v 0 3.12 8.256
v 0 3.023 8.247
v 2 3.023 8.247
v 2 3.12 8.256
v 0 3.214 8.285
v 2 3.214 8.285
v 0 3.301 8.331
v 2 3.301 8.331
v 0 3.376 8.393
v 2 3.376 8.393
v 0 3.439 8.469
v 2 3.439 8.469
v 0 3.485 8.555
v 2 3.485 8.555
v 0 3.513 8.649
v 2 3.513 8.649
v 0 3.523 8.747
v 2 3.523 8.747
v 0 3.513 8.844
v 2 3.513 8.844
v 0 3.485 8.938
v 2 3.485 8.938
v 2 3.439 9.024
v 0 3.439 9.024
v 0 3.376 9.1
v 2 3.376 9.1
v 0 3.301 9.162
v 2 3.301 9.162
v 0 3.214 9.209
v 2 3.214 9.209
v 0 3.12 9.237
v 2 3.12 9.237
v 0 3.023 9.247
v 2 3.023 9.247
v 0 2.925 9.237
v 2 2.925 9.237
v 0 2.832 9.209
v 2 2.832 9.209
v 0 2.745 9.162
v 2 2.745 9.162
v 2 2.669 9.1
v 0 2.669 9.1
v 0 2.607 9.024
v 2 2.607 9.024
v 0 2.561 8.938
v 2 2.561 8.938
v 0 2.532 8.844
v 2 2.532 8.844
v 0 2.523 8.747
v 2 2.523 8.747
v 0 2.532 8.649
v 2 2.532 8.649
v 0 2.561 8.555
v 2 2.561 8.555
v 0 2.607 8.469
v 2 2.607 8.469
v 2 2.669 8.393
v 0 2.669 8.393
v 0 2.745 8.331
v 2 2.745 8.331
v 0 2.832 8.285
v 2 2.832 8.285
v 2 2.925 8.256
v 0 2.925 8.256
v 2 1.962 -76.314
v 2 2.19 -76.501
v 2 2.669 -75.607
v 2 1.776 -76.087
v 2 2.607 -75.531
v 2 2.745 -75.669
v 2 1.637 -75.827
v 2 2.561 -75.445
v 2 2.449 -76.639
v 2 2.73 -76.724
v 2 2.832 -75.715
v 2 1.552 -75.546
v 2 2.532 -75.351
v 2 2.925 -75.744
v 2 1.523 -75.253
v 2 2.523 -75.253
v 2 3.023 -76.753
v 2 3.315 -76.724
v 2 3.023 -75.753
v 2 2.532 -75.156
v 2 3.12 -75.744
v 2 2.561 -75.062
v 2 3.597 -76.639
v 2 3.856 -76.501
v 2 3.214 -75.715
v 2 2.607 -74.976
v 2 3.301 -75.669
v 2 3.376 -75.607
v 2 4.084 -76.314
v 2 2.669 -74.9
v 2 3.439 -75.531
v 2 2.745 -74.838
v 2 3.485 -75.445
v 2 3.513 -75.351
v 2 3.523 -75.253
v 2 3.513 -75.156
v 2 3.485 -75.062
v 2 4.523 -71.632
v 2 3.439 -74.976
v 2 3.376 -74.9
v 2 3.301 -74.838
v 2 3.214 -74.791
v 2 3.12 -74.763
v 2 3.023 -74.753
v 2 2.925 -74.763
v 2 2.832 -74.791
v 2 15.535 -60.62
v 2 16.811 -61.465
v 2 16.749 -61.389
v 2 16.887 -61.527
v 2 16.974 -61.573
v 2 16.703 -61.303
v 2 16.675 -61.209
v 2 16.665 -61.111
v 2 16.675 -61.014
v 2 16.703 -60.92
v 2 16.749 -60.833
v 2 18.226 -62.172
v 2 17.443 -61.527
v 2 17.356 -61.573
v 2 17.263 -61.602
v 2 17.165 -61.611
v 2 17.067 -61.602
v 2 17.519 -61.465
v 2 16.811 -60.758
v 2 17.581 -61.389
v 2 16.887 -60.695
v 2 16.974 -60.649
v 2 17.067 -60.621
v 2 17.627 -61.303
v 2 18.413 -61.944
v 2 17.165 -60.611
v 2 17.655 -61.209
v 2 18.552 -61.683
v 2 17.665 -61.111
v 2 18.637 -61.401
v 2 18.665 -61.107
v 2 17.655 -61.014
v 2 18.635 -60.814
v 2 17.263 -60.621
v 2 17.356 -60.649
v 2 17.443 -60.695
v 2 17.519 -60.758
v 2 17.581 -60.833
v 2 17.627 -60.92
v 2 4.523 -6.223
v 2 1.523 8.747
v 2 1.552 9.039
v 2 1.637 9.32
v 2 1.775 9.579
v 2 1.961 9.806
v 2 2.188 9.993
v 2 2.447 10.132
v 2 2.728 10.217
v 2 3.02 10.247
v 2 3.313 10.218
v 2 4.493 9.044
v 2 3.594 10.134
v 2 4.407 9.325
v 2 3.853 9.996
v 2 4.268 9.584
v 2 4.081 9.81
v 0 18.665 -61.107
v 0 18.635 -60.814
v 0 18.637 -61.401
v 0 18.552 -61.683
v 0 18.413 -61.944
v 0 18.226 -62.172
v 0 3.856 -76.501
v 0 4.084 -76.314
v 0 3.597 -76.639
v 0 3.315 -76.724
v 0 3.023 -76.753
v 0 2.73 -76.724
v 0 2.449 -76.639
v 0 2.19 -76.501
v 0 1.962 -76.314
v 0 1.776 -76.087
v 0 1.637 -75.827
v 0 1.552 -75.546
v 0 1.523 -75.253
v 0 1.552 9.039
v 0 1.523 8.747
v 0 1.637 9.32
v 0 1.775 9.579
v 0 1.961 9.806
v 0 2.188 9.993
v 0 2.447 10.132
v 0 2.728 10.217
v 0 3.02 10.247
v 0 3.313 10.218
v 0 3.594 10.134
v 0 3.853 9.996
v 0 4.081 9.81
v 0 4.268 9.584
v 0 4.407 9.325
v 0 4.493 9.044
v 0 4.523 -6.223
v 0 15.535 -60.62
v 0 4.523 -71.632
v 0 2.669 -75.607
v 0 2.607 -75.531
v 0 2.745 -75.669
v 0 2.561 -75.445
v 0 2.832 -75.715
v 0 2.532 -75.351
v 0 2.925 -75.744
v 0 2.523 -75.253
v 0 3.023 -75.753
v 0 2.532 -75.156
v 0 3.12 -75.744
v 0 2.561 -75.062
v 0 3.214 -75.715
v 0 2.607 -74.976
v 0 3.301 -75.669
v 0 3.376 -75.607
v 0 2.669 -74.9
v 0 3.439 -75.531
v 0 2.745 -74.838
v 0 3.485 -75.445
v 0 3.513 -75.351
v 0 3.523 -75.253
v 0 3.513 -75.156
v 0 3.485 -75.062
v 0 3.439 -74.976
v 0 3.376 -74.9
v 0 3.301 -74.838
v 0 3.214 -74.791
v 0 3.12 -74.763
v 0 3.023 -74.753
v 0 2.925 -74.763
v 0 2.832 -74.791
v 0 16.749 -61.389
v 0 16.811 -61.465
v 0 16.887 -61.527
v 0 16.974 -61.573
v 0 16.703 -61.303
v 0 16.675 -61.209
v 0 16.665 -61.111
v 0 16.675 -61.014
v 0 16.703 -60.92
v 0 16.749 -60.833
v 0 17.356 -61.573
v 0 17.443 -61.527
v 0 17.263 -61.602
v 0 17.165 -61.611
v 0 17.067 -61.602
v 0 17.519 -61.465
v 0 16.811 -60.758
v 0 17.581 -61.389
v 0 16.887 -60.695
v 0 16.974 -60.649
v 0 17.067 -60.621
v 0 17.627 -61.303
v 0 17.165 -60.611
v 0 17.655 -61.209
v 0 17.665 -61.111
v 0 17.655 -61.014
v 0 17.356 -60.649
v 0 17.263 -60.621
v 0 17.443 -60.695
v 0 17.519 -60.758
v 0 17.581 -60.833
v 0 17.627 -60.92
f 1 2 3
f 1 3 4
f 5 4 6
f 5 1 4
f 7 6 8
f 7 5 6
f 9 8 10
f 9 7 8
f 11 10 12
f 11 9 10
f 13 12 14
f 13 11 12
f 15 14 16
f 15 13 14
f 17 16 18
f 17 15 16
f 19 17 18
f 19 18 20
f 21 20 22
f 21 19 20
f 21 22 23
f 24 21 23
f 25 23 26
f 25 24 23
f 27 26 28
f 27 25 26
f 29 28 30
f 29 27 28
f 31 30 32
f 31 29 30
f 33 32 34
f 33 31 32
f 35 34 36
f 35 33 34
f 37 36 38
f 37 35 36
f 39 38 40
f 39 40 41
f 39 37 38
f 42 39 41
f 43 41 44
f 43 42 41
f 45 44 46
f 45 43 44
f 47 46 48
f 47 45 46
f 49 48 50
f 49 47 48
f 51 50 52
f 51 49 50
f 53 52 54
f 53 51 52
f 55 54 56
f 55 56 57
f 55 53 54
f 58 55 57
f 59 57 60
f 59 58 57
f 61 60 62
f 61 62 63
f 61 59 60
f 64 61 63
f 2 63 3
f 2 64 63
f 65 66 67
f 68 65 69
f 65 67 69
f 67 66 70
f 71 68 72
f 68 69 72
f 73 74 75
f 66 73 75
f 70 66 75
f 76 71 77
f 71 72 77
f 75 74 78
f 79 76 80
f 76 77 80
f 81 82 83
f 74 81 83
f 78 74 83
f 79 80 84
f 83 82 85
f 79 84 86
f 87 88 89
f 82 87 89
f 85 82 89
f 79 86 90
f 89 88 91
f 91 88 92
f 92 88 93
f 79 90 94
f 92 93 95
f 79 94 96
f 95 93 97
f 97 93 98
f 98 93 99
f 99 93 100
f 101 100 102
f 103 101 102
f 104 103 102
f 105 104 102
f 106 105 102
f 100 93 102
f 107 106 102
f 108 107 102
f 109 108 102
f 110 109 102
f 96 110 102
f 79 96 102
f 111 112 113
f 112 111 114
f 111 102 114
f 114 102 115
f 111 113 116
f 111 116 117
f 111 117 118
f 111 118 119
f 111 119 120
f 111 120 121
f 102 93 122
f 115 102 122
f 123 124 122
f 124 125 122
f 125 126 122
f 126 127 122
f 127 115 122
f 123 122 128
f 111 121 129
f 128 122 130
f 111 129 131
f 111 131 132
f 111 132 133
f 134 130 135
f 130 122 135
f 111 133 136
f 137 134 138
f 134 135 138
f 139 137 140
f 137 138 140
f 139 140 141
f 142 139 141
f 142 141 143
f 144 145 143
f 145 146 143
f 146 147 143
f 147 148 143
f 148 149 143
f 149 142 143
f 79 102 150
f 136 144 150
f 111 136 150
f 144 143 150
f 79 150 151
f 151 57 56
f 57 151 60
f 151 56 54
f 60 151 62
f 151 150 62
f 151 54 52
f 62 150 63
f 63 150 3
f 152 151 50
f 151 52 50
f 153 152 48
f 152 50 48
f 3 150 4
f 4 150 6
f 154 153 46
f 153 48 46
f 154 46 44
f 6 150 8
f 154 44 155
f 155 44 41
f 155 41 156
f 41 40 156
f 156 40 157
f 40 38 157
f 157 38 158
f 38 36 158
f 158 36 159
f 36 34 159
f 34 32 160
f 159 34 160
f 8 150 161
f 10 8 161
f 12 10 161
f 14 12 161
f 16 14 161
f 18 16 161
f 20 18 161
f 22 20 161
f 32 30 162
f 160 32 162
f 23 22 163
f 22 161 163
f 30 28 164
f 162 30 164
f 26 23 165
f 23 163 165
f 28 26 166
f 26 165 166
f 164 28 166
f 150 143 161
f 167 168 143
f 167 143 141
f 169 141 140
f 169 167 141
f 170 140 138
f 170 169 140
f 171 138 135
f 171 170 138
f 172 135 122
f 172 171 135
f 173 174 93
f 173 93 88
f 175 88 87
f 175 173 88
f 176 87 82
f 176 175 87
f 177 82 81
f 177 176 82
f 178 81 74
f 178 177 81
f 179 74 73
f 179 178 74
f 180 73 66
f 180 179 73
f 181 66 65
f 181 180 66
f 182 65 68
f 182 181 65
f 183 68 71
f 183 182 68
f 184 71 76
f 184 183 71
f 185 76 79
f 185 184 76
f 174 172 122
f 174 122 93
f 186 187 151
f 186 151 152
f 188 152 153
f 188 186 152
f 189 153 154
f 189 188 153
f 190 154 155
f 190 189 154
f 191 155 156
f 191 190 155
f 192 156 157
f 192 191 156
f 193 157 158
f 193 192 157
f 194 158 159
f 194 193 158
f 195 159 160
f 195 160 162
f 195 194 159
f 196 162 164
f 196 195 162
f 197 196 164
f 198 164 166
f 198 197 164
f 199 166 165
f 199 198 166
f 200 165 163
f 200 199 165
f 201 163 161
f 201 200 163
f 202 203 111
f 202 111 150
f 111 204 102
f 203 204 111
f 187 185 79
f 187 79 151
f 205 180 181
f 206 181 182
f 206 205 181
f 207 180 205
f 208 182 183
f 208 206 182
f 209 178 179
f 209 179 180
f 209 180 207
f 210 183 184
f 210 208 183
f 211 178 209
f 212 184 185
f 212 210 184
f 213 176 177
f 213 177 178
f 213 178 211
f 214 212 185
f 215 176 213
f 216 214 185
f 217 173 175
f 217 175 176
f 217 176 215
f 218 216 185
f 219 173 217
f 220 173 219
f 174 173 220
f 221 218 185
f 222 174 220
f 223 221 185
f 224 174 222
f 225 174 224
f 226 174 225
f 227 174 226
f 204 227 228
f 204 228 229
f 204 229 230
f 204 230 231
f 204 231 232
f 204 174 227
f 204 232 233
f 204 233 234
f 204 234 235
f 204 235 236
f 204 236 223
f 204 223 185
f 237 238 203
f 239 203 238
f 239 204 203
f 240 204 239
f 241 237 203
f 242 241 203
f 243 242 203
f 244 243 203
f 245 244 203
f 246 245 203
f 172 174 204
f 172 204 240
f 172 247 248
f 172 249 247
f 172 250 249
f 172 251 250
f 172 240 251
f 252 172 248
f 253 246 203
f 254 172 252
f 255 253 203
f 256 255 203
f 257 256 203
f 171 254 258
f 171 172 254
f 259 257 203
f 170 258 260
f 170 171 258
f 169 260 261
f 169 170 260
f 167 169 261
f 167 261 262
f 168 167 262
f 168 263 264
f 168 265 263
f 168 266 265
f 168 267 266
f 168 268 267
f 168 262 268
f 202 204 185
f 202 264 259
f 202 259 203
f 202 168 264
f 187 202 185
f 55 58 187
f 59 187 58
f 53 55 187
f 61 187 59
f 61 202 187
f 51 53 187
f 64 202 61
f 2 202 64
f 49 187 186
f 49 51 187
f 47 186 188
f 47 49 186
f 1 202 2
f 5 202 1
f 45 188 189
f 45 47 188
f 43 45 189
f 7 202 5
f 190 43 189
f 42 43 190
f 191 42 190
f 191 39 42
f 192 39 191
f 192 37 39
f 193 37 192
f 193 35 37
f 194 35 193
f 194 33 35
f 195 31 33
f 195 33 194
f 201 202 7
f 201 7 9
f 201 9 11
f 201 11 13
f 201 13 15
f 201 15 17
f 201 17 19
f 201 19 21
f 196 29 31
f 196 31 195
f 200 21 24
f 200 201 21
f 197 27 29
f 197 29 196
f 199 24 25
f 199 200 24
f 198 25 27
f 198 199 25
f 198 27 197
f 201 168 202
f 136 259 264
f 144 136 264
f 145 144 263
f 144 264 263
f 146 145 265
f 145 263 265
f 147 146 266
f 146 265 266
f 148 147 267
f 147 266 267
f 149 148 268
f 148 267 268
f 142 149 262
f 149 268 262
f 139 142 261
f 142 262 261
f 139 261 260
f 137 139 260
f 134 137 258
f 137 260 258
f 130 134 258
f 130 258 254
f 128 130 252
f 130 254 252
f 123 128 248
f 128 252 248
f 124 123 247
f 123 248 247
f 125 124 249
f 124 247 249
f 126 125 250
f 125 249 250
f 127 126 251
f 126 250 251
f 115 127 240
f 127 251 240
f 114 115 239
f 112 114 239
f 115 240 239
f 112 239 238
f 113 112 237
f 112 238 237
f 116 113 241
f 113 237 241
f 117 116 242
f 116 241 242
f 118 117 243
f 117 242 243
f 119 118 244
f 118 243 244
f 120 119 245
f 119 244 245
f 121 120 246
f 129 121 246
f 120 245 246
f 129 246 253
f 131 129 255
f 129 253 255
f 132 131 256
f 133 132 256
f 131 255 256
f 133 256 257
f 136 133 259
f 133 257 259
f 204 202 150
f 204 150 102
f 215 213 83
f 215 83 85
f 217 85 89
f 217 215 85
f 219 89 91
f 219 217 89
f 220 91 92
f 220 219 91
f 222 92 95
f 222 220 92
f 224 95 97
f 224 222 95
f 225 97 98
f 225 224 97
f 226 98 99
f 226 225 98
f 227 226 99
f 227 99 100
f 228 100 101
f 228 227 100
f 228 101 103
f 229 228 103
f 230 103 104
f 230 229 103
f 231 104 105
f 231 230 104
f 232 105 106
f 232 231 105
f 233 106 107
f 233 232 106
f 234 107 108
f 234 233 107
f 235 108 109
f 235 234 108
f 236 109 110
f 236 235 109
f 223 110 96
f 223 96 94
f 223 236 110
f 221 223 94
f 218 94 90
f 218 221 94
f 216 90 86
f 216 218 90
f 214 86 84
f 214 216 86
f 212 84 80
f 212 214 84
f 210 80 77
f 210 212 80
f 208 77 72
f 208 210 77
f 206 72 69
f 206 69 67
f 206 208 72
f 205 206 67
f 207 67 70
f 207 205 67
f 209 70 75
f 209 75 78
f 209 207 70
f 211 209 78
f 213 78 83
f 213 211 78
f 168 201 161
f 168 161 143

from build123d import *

# Parameters (mm, degrees)
SKETCH_1_R      = 0.5
EXTRUDE_1_DEPTH = 2
SKETCH_2_R      = 0.5
EXTRUDE_2_DEPTH = 2


with BuildPart() as part:
    # 草图1 → 凸台-拉伸1 (new body)
    with BuildSketch(Plane(origin=(0, 0, 0), x_dir=(0, 0, -1), z_dir=(1, 0, 0))):
        with BuildLine():
            Line((-8.746696486, 4.522861275), (75.253303514, 4.522861275))
            ThreePointArc((75.253303514, 4.522861275), (76.753303514, 3.022861275), (75.253303514, 1.522861275))
            Line((75.253303514, 1.522861275), (-8.746696486, 1.522861275))
            ThreePointArc((-8.746696486, 1.522861275), (-10.246696486, 3.022861275), (-8.746696486, 4.522861275))
        make_face()
        with Locations((-8.746696486, 3.022861275)):
            Circle(SKETCH_1_R, mode=Mode.SUBTRACT)
        with Locations((75.253303514, 3.022861275)):
            Circle(SKETCH_1_R, mode=Mode.SUBTRACT)
    extrude(amount=EXTRUDE_1_DEPTH)

    # 草图2 → 凸台-拉伸2 (add)
    with BuildSketch(Plane.ZY):
        with BuildLine():
            Line((-62.171828062, 18.22565707), (-76.313963686, 4.083521447))
            ThreePointArc((-76.313963686, 4.083521447), (-76.313963686, 1.962201103), (-74.192643342, 1.962201103))
            Line((-74.192643342, 1.962201103), (-60.619757708, 15.535086737))
            Line((-60.619757708, 15.535086737), (8.449071616, 1.552684606))
            ThreePointArc((8.449071616, 1.552684606), (10.216873155, 2.725236404), (9.044321357, 4.493037943))
            Line((9.044321357, 4.493037943), (-60.81354302, 18.635173567))
            ThreePointArc((-60.81354302, 18.635173567), (-61.544159412, 18.601143946), (-62.171828062, 18.22565707))
        make_face()
        with Locations((-61.11116789, 17.164996899)):
            Circle(SKETCH_2_R, mode=Mode.SUBTRACT)
        with Locations(Location((-75.253303514, 3.022861275, 0), (0, 0, 180))):
            Circle(SKETCH_2_R, mode=Mode.SUBTRACT)
        with Locations(Location((8.746696486, 3.022861275, 0), (0, 0, 180))):
            Circle(SKETCH_2_R, mode=Mode.SUBTRACT)
    extrude(amount=-EXTRUDE_2_DEPTH)


solid = part.part
